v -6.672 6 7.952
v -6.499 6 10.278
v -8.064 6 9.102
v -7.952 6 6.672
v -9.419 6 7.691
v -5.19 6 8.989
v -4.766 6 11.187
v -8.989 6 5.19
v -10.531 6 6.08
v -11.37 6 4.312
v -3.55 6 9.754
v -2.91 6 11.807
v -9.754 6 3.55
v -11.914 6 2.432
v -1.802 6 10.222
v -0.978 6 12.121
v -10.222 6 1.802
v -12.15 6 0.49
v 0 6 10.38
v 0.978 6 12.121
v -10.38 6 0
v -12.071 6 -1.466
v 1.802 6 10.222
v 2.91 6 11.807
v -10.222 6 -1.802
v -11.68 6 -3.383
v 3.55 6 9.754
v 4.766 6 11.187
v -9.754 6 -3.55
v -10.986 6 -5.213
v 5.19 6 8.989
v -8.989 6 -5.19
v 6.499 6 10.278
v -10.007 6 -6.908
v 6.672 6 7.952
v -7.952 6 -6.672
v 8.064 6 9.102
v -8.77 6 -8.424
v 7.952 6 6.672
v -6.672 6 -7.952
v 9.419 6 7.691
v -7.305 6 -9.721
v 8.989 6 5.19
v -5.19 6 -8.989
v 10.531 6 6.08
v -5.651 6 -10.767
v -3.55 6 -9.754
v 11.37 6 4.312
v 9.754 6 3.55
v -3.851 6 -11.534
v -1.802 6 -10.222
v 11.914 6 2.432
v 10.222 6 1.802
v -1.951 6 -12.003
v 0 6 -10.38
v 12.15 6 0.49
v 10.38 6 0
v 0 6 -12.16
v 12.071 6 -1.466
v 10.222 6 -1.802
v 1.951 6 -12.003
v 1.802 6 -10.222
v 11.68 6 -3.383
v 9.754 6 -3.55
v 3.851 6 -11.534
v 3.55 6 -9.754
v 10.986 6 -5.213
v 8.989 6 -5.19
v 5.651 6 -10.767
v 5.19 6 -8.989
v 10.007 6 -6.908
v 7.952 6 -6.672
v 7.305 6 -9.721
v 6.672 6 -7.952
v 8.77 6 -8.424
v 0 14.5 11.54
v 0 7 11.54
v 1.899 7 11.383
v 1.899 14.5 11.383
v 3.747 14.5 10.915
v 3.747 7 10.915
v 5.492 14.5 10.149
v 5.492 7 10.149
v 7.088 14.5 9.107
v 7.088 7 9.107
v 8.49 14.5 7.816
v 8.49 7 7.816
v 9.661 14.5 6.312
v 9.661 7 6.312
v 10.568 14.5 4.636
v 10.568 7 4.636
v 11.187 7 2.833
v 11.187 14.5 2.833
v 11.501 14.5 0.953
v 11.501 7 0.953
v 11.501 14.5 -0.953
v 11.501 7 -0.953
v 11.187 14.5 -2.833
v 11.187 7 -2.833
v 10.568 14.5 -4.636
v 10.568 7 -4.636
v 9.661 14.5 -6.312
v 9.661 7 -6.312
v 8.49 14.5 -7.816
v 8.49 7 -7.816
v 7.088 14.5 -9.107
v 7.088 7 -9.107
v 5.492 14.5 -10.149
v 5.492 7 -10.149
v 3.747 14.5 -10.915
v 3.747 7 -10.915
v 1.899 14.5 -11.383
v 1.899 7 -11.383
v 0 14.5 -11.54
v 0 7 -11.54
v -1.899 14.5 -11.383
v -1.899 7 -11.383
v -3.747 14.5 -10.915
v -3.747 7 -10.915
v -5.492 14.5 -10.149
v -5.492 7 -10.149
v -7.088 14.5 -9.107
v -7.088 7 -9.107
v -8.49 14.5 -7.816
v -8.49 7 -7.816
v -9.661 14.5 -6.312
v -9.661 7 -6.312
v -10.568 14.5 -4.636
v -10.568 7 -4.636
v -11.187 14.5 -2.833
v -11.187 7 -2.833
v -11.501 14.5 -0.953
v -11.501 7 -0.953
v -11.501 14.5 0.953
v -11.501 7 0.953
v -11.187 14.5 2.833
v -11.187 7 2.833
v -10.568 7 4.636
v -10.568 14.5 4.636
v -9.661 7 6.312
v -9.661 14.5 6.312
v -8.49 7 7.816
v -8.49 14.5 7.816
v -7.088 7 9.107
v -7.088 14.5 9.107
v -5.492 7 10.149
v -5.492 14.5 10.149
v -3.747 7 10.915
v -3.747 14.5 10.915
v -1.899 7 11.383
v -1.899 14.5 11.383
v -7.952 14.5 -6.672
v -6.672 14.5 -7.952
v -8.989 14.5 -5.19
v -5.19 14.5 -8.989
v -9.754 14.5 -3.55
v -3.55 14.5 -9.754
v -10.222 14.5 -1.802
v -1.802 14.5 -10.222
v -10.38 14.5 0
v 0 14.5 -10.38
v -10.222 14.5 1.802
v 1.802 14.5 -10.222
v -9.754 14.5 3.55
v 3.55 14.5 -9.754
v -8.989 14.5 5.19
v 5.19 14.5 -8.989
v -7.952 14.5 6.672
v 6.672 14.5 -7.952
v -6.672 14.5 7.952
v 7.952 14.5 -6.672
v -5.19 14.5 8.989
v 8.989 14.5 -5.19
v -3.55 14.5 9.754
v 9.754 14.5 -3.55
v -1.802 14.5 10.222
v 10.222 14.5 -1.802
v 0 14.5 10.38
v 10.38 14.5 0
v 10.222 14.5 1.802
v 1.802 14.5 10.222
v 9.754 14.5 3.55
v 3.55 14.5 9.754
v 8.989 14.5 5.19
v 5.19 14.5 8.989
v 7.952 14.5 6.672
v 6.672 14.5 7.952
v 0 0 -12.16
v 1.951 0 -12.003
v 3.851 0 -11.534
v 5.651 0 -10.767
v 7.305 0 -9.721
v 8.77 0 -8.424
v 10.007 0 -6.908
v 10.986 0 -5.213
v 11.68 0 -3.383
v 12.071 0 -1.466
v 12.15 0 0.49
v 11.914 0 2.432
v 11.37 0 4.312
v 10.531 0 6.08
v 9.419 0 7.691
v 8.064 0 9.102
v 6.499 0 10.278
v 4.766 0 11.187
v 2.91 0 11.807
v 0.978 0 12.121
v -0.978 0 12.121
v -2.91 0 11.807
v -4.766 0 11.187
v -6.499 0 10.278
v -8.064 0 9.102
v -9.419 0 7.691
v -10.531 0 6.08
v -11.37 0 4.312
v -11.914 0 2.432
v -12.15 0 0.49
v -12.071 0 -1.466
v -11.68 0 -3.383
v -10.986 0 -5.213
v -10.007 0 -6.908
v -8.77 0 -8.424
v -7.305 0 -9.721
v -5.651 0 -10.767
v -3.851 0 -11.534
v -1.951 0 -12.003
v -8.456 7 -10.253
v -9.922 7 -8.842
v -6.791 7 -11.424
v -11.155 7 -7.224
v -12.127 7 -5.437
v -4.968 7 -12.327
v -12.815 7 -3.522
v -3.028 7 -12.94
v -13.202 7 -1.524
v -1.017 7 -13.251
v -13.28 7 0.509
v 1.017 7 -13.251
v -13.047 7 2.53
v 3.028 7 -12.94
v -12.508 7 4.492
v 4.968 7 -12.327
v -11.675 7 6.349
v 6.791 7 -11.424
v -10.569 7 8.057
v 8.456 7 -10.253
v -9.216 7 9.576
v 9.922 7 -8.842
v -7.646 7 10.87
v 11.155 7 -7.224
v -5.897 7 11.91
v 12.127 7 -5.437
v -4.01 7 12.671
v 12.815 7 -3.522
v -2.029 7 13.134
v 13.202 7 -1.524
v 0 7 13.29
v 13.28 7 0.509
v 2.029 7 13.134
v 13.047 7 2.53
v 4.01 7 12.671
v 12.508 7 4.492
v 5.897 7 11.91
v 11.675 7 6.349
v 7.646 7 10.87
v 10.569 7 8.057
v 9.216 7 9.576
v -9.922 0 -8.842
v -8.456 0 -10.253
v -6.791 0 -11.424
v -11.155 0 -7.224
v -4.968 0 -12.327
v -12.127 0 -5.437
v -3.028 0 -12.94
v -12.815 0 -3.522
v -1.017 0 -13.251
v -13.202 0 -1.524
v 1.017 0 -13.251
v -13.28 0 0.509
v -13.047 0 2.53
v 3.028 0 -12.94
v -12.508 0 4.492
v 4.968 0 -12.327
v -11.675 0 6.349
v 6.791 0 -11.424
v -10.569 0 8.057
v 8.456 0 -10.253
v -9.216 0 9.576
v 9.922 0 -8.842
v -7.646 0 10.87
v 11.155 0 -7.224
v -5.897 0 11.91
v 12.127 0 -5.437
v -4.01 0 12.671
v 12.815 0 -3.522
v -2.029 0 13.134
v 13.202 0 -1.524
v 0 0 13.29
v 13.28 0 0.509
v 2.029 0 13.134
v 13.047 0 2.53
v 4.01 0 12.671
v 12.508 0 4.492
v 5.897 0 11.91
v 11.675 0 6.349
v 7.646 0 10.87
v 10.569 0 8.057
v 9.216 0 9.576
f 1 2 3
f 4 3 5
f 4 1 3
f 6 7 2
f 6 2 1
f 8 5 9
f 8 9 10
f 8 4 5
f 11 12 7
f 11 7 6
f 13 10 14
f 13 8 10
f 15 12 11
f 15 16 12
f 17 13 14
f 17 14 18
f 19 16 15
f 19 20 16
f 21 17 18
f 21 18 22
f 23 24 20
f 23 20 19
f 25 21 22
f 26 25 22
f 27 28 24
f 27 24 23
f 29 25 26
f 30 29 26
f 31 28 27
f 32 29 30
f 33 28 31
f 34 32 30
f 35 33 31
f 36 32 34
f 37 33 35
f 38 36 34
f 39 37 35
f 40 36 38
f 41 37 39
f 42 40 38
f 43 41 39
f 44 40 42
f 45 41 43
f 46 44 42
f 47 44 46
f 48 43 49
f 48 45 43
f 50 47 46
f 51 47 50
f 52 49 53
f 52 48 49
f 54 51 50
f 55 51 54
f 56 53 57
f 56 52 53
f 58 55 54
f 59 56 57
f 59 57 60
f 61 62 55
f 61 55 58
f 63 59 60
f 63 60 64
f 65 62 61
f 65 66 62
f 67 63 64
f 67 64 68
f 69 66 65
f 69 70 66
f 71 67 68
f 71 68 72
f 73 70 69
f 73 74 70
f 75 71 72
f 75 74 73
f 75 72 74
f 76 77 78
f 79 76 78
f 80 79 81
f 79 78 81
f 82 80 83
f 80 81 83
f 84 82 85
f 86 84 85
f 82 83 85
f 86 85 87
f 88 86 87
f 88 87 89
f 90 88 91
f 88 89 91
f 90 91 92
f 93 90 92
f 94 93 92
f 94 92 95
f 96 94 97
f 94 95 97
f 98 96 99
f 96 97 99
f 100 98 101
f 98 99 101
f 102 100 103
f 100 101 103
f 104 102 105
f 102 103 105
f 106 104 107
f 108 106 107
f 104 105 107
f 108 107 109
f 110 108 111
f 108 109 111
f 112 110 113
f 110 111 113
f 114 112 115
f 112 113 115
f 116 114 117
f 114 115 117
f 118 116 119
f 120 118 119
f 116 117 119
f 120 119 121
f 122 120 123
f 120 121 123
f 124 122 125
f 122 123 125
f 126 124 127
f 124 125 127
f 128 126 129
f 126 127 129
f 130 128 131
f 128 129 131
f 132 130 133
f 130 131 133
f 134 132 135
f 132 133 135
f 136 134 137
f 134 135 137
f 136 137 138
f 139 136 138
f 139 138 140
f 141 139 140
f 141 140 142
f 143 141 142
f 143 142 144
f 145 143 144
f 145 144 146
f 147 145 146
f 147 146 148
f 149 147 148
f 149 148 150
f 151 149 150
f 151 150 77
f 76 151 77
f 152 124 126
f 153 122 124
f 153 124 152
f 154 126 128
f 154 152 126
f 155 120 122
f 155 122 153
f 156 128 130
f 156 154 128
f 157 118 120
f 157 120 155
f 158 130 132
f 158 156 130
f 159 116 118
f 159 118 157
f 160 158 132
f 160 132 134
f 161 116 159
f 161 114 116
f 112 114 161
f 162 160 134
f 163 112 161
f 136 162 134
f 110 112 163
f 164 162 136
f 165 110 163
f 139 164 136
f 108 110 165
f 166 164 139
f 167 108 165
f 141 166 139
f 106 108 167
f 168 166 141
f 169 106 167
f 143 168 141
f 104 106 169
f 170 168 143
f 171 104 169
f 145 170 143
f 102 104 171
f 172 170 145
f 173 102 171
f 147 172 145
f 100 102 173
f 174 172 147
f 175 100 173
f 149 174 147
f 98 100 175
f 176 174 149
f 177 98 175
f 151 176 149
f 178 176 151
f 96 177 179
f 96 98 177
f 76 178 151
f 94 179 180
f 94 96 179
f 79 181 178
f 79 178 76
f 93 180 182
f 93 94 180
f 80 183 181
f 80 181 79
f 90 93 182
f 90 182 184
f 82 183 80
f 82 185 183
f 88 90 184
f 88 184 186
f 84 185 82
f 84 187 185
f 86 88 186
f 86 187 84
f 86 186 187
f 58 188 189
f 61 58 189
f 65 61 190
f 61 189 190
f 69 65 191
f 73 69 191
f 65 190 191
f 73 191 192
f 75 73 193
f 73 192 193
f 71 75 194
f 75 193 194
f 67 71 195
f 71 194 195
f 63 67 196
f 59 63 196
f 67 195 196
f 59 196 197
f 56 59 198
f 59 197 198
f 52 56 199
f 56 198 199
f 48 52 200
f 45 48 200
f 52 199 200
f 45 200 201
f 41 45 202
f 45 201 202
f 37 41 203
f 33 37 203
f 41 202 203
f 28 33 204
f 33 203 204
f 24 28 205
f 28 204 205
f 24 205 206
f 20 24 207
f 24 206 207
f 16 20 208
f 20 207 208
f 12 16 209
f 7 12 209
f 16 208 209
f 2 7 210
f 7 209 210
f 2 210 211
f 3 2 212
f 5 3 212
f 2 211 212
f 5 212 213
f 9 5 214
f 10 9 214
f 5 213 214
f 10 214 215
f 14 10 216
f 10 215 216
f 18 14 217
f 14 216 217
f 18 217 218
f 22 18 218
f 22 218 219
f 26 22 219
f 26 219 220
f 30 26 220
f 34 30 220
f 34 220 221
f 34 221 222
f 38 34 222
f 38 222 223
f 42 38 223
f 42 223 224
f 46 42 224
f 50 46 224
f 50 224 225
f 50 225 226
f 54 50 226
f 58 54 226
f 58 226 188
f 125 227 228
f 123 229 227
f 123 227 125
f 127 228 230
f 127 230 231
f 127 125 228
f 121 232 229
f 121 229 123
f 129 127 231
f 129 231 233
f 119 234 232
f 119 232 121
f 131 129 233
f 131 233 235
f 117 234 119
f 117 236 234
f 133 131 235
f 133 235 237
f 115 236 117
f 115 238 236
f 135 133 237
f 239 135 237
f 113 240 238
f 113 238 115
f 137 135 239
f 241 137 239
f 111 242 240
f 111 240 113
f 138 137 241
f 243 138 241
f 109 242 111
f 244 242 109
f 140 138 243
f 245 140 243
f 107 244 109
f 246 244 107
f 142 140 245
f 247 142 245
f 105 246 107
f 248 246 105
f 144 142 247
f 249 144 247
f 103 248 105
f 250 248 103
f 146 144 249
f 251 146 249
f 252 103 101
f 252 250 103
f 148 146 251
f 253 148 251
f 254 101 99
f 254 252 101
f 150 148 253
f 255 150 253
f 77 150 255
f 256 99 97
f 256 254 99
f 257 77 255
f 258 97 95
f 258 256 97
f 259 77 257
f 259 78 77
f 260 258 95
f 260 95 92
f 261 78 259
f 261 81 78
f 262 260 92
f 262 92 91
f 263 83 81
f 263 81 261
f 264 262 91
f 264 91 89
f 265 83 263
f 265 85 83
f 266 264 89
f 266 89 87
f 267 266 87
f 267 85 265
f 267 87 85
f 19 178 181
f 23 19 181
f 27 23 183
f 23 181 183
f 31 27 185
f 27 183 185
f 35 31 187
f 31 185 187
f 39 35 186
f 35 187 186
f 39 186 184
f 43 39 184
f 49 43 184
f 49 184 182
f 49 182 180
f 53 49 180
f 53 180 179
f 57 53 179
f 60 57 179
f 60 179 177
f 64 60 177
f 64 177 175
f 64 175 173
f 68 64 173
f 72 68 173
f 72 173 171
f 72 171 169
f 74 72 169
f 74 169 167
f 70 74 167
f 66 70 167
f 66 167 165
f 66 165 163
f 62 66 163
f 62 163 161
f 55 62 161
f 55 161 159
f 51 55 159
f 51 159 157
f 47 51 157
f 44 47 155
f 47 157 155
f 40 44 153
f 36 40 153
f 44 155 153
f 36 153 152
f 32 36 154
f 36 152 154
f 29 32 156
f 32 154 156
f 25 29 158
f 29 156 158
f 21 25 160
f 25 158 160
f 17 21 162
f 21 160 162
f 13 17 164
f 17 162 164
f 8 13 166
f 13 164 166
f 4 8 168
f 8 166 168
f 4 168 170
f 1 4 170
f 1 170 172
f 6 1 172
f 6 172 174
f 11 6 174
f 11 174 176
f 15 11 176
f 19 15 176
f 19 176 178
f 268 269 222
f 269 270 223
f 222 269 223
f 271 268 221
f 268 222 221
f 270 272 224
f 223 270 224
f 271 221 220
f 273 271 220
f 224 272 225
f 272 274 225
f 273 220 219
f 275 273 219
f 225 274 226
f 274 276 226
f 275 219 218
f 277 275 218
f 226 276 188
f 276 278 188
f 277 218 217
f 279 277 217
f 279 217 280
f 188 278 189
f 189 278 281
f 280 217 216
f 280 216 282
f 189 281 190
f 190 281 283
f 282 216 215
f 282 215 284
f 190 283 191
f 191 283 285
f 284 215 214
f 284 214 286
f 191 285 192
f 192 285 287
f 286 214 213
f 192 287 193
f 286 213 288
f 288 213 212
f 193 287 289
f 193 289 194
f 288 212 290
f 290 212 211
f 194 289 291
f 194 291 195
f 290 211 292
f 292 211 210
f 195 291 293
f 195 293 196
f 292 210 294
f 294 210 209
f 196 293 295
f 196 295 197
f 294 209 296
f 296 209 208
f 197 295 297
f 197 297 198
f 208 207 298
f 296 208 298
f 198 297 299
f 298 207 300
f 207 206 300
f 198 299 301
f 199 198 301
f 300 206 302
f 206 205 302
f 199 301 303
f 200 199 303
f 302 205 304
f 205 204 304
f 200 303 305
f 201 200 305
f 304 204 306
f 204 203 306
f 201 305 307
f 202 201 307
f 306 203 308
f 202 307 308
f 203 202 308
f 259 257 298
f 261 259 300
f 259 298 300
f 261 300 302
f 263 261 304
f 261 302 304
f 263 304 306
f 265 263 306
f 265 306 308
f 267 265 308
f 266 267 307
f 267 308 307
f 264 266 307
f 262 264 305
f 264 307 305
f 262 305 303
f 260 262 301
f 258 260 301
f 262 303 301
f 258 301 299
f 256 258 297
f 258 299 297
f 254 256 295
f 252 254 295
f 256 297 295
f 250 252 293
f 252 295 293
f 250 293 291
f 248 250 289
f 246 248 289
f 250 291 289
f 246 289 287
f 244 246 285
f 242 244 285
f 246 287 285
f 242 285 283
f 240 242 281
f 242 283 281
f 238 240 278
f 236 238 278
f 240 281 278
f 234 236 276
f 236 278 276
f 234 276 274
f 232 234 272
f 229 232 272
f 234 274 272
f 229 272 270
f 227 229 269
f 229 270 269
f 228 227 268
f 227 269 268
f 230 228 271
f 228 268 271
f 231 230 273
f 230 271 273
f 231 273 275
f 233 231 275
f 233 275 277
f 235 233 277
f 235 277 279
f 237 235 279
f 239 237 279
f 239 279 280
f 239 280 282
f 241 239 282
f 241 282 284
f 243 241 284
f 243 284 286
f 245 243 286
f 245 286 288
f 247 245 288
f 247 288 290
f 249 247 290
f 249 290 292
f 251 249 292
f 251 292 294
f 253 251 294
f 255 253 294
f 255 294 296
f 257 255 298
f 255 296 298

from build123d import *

# Parameters (mm, degrees)
SKETCH1_R           = 13.29
BOSS_EXTRUDE1_DEPTH = 7
SKETCH2_R           = 11.54
BOSS_EXTRUDE2_DEPTH = 7.5
SKETCH3_R           = 12.16
CUT_EXTRUDE2_DEPTH  = 6
SKETCH4_R           = 10.38
CUT_EXTRUDE4_DEPTH  = 9


with BuildPart() as part:
    # Sketch1 → Boss-Extrude1 (new body)
    with BuildSketch(Plane(origin=(0, 0, 0), x_dir=(1, 0, 0), z_dir=(0, 1, 0))):
        with Locations(Location((0, 0, 0), (0, 0, 270))):
            Circle(SKETCH1_R)
    extrude(amount=BOSS_EXTRUDE1_DEPTH)

    # Sketch2 → Boss-Extrude2 (add)
    with BuildSketch(Plane(origin=(0, 7, 0), x_dir=(1, 0, 0), z_dir=(0, 1, 0))):
        with Locations(Location((0, 0, 0), (0, 0, 270))):
            Circle(SKETCH2_R)
    extrude(amount=BOSS_EXTRUDE2_DEPTH)

    # Sketch3 → Cut-Extrude2 (cut)
    with BuildSketch(Plane(origin=(0, 0, 0), x_dir=(-1, 0, 0), z_dir=(0, -1, 0))):
        with Locations(Location((0, 0, 0), (0, 0, 90))):
            Circle(SKETCH3_R)
    extrude(amount=-CUT_EXTRUDE2_DEPTH, mode=Mode.SUBTRACT)

    # Sketch4 → Cut-Extrude4 (cut)
    with BuildSketch(Plane(origin=(0, 14.5, 0), x_dir=(1, 0, 0), z_dir=(0, 1, 0))):
        with Locations(Location((0, 0, 0), (0, 0, 270))):
            Circle(SKETCH4_R)
    extrude(amount=-CUT_EXTRUDE4_DEPTH, mode=Mode.SUBTRACT)


solid = part.part
